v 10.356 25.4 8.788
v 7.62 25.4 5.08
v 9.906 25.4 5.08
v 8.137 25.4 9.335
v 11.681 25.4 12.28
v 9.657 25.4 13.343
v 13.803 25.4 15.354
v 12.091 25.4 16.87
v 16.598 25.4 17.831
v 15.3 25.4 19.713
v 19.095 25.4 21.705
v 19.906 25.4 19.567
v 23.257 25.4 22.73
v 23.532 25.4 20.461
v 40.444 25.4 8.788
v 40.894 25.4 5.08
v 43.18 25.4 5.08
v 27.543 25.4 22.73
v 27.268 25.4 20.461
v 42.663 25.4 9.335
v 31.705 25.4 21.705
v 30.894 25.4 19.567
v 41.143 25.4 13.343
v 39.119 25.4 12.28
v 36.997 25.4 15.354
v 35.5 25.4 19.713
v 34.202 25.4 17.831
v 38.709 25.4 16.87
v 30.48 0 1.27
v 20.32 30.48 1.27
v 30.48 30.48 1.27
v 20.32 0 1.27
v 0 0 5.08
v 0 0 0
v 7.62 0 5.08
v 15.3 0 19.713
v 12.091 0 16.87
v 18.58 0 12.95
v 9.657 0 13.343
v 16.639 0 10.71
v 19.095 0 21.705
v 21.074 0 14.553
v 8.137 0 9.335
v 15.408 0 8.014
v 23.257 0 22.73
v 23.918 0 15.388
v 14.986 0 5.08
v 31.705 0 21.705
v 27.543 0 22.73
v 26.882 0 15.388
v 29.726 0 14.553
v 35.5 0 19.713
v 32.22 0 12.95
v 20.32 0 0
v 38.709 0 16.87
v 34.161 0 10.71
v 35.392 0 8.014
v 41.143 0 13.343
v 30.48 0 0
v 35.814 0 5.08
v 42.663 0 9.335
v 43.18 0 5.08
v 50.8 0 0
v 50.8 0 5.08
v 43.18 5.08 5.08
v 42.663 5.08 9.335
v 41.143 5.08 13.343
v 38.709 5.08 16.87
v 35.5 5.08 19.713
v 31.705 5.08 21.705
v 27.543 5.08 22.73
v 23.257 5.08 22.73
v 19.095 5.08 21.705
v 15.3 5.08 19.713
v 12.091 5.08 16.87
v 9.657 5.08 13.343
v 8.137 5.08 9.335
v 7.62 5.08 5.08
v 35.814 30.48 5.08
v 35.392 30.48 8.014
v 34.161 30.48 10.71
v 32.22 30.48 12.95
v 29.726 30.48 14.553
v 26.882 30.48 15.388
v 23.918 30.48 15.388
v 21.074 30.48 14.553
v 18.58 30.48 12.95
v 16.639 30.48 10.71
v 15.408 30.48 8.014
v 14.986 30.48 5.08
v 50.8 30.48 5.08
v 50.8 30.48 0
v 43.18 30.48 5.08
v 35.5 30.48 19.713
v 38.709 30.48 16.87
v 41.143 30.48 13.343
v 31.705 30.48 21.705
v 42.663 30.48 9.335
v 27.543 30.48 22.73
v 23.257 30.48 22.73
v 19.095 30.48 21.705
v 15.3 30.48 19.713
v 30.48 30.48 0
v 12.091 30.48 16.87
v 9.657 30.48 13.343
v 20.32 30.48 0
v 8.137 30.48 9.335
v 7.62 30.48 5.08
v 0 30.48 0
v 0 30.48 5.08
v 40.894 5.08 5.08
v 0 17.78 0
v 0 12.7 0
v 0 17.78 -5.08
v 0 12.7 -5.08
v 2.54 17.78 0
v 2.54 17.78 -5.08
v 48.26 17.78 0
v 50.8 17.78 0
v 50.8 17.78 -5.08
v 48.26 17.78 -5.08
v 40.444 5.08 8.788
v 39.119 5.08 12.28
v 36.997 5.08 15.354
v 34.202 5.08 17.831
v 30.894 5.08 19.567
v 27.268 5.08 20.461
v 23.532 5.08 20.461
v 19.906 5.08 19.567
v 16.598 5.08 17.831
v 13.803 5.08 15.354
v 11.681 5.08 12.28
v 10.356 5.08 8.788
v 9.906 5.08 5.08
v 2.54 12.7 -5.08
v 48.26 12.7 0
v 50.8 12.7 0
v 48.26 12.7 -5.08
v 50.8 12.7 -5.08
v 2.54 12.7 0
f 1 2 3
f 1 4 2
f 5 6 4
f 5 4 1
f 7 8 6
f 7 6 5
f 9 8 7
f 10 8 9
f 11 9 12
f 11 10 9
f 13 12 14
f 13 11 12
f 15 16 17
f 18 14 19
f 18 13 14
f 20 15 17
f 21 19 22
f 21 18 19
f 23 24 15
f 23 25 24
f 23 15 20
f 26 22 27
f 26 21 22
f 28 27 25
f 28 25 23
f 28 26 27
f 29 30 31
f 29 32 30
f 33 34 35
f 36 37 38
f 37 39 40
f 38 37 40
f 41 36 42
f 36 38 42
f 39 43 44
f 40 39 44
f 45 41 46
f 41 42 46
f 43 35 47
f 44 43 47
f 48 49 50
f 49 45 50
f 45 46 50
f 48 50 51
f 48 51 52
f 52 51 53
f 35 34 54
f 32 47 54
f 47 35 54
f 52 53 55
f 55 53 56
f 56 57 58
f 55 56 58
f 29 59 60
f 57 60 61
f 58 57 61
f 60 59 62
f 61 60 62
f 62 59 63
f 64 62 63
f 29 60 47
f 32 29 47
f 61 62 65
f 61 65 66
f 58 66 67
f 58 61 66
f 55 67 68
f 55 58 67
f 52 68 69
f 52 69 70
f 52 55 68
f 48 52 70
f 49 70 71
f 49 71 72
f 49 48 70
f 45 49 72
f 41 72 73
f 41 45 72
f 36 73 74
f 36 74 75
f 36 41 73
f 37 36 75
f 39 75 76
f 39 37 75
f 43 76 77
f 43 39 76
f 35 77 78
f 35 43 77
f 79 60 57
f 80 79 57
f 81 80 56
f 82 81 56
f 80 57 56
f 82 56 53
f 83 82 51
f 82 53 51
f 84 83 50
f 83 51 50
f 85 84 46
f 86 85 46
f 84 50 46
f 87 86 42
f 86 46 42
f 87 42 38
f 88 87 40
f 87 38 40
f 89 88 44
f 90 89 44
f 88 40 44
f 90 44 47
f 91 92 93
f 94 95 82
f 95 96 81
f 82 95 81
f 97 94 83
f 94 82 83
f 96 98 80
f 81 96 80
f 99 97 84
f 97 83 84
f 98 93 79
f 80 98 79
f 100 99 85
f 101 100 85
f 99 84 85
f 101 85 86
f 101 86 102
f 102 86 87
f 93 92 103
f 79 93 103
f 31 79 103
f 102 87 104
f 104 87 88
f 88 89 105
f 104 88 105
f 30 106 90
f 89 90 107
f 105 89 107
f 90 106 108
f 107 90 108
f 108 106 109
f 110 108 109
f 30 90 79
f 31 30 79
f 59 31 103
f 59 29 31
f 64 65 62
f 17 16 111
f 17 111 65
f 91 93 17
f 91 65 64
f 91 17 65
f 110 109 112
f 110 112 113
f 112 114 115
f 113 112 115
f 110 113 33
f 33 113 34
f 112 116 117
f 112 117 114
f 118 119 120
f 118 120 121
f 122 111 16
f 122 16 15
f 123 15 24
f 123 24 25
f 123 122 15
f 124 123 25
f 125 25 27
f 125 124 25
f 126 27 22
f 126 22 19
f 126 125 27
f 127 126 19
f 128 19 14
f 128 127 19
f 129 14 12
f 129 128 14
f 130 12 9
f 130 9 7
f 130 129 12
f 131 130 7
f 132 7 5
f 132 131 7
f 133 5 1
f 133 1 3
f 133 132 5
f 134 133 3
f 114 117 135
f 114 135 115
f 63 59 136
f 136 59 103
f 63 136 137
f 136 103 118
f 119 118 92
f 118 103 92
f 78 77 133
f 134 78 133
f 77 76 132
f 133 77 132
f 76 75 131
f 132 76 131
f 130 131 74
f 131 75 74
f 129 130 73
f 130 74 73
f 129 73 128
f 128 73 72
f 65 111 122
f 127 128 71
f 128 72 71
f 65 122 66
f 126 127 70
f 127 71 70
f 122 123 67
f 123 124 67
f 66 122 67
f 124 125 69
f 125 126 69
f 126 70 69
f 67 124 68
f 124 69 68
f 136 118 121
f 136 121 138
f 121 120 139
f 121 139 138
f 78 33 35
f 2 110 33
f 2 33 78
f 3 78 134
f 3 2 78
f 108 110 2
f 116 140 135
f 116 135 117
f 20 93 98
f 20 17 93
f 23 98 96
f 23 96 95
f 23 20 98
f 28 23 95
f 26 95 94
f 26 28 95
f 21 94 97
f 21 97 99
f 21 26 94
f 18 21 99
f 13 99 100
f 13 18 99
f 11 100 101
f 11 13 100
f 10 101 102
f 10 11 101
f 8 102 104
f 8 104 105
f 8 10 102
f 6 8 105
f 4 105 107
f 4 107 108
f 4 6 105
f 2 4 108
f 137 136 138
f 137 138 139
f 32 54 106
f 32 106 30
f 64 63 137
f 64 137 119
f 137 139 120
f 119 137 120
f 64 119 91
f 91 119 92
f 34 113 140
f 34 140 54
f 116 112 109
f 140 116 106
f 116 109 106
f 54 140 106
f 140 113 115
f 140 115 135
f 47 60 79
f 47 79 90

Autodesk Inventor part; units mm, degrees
ref_plane "YZ Plane" through (0, 0, 0) normal (1, 0, 0) x (0, 1, 0)
ref_plane "XZ Plane" through (0, 0, 0) normal (0, 1, 0) x (-1, 0, 0)
ref_plane "XY Plane" through (0, 0, 0) normal (0, 0, 1) x (1, 0, 0)
sketch "base_sketch" plane through (0, 0, 0) normal (0, 0, 1) x (1, 0, 0)
  line L0 (0, 0) -> (50.8, 0)
  line L1 (50.8, 0) -> (50.8, 30.48)
  line L2 (50.8, 30.48) -> (0, 30.48)
  line L3 (0, 30.48) -> (0, 0)
  dimension "d0" = 50.8
  dimension "d1" = 30.48
extrude "base_extrusion" add sketch "base_sketch" along normal blind 5.08
sketch "moon_sketch" plane through (0, 0, 5.08) normal (0, 0, 1) x (1, 0, 0)
  line L0 (0, 30.48) -> (0, 0) projected
  line L1 (0, 15.24) -> (25.4, 15.24) construction
  line L2 (25.4, 15.24) -> (50.8, 15.24) construction
  line L3 (25.4, 30.48) -> (25.4, 15.24)
  line L4 (0, 0) -> (50.8, 0) projected
  line L5 (25.4, 0) -> (25.4, 15.24)
  line L6 (50.8, 30.48) -> (0, 30.48) projected
  line L7 (25.4, 30.48) -> (43.18, 30.48)
  line L8 (43.18, 30.48) -> (43.18, 25.4)
  line L9 (43.18, 25.4) -> (40.894, 25.4)
  line L10 (40.894, 25.4) -> (40.894, 5.08)
  line L11 (40.894, 5.08) -> (43.18, 5.08)
  line L12 (43.18, 5.08) -> (43.18, 0)
  dimension "d4" = 17.78
  dimension "d5" = 5.08
  dimension "d6" = 2.286
revolve "moon_revolution" add sketch "moon_sketch" angle 180 about axis through (25.4, 30.48, 5.08) along (0, -1, 0) contours L6 L8 L9 L10 L11 L12 L4 L5 L3
sketch "cutout_sketch" plane through (0, 0, 0) normal (0, -1, 0) x (1, 0, 0)
  line L0 (43.18, 5.08) -> (7.62, 5.08)
  line L1 (42.8625, 5.08) -> (46.0375, 5.08) projected
  arc A0 (40.894, 5.08) -> (9.906, 5.08) centre (25.4, 5.08) ccw projected
  circle A1 centre (25.4, 5.08) radius 10.414
  line L2 (35.814, 5.08) -> (14.986, 5.08)
  point P0 (0, 0)
  point P1 (53.594, 5.08)
  point P2 (-2.794, 5.08)
  dimension "d16" = 5.08
extrude "cutout_extrusion" cut sketch "cutout_sketch" against normal up to next contours L0 A1 picked at (24.9454, 10.8279)
sketch "peg_sketch" plane through (0, 0, 0) normal (0, 0, -1) x (-1, 0, 0)
  line L0 (-50.8, 17.78) -> (-48.26, 17.78)
  line L1 (-48.26, 17.78) -> (-48.26, 12.7)
  line L2 (-48.26, 12.7) -> (-50.8, 12.7)
  line L3 (-50.8, 0) -> (-50.8, 30.48) projected
  line L4 (-50.8, 0) -> (-50.8, 12.7) construction
  line L5 (-50.8, 30.48) -> (-50.8, 17.78) construction
  line L6 (-50.8, 17.78) -> (-50.8, 12.7)
  line L7 (-2.54, 17.78) -> (0, 17.78)
  line L8 (0, 17.78) -> (0, 12.7)
  line L9 (0, 12.7) -> (-2.54, 12.7)
  line L10 (-2.54, 12.7) -> (-2.54, 17.78)
  line L11 (0, 30.48) -> (0, 17.78) construction
  line L12 (0, 12.7) -> (0, 0) construction
  line L13 (0, 30.48) -> (0, 0) construction
  dimension "d19" = 5.08
  dimension "d20" = 2.54
  dimension "d21" = 5.08
  dimension "d22" = 2.54
extrude "peg_extrusion" add sketch "peg_sketch" along normal blind 5.08
sketch "rivet_groove_sketch" plane through (0, 0, 0) normal (0, -1, 0) x (1, 0, 0)
  line L0 (20.32, 1.27) -> (30.48, 1.27)
  line L1 (30.48, 1.27) -> (30.48, 0)
  line L2 (30.48, 0) -> (20.32, 0)
  line L3 (20.32, 0) -> (20.32, 1.27)
  line L4 (50.8, 0) -> (30.48, 0) construction
  line L5 (0, 0) -> (20.32, 0) construction
  line L6 (50.8, 0) -> (50.8, 5.08) projected
  line L7 (0, 0) -> (50.8, 0) projected
  dimension "d25" = 10.16
  dimension "d26" = 1.27
extrude "rivet_groove_extrusion" cut sketch "rivet_groove_sketch" against normal up to next
equation "\"d0\" = hm_base_length"
equation "\"d1\" = hm_base_width"
equation "\"d2\" = hm_base_height"
equation "\"d4\" = hm_moon_flange_radius"
equation "\"d5\" = hm_moon_flange_width"
equation "\"d6\" = hm_moon_channel_offset"
equation "\"d16\" = hm_moon_thickness"
equation "\"d19\" = hm_peg_length"
equation "\"d20\" = hm_peg_width"
equation "\"d21\" = hm_peg_length"
equation "\"d22\" = hm_peg_width"
equation "\"d23\" = hm_peg_height"
equation "\"d25\" = hm_rivet_groove_width"
equation "\"d26\" = hm_rivet_groove_height"
equation "\"d27\" = hm_peg_height"
equation "\"hm_base_width\" = 30.48"
equation "\"hm_base_length\" = 50.8"
equation "\"hm_moon_flange_radius\" = 17.78"
equation "\"hm_moon_channel_offset\" = 2.286"
equation "\"hm_moon_flange_width\" = 5.08"
equation "\"hm_moon_thickness\" = 5.08"
equation "\"hm_peg_width\" = 2.54"
equation "\"hm_peg_length\" = 5.08"
equation "\"hm_base_height\" = 5.08"
equation "\"hm_peg_height\" = 5.08"
equation "\"hm_rivet_groove_width\" = 10.16"
equation "\"hm_rivet_groove_height\" = 1.27"
properties part number "half_moon(hm)" material "ABS Plastic"
